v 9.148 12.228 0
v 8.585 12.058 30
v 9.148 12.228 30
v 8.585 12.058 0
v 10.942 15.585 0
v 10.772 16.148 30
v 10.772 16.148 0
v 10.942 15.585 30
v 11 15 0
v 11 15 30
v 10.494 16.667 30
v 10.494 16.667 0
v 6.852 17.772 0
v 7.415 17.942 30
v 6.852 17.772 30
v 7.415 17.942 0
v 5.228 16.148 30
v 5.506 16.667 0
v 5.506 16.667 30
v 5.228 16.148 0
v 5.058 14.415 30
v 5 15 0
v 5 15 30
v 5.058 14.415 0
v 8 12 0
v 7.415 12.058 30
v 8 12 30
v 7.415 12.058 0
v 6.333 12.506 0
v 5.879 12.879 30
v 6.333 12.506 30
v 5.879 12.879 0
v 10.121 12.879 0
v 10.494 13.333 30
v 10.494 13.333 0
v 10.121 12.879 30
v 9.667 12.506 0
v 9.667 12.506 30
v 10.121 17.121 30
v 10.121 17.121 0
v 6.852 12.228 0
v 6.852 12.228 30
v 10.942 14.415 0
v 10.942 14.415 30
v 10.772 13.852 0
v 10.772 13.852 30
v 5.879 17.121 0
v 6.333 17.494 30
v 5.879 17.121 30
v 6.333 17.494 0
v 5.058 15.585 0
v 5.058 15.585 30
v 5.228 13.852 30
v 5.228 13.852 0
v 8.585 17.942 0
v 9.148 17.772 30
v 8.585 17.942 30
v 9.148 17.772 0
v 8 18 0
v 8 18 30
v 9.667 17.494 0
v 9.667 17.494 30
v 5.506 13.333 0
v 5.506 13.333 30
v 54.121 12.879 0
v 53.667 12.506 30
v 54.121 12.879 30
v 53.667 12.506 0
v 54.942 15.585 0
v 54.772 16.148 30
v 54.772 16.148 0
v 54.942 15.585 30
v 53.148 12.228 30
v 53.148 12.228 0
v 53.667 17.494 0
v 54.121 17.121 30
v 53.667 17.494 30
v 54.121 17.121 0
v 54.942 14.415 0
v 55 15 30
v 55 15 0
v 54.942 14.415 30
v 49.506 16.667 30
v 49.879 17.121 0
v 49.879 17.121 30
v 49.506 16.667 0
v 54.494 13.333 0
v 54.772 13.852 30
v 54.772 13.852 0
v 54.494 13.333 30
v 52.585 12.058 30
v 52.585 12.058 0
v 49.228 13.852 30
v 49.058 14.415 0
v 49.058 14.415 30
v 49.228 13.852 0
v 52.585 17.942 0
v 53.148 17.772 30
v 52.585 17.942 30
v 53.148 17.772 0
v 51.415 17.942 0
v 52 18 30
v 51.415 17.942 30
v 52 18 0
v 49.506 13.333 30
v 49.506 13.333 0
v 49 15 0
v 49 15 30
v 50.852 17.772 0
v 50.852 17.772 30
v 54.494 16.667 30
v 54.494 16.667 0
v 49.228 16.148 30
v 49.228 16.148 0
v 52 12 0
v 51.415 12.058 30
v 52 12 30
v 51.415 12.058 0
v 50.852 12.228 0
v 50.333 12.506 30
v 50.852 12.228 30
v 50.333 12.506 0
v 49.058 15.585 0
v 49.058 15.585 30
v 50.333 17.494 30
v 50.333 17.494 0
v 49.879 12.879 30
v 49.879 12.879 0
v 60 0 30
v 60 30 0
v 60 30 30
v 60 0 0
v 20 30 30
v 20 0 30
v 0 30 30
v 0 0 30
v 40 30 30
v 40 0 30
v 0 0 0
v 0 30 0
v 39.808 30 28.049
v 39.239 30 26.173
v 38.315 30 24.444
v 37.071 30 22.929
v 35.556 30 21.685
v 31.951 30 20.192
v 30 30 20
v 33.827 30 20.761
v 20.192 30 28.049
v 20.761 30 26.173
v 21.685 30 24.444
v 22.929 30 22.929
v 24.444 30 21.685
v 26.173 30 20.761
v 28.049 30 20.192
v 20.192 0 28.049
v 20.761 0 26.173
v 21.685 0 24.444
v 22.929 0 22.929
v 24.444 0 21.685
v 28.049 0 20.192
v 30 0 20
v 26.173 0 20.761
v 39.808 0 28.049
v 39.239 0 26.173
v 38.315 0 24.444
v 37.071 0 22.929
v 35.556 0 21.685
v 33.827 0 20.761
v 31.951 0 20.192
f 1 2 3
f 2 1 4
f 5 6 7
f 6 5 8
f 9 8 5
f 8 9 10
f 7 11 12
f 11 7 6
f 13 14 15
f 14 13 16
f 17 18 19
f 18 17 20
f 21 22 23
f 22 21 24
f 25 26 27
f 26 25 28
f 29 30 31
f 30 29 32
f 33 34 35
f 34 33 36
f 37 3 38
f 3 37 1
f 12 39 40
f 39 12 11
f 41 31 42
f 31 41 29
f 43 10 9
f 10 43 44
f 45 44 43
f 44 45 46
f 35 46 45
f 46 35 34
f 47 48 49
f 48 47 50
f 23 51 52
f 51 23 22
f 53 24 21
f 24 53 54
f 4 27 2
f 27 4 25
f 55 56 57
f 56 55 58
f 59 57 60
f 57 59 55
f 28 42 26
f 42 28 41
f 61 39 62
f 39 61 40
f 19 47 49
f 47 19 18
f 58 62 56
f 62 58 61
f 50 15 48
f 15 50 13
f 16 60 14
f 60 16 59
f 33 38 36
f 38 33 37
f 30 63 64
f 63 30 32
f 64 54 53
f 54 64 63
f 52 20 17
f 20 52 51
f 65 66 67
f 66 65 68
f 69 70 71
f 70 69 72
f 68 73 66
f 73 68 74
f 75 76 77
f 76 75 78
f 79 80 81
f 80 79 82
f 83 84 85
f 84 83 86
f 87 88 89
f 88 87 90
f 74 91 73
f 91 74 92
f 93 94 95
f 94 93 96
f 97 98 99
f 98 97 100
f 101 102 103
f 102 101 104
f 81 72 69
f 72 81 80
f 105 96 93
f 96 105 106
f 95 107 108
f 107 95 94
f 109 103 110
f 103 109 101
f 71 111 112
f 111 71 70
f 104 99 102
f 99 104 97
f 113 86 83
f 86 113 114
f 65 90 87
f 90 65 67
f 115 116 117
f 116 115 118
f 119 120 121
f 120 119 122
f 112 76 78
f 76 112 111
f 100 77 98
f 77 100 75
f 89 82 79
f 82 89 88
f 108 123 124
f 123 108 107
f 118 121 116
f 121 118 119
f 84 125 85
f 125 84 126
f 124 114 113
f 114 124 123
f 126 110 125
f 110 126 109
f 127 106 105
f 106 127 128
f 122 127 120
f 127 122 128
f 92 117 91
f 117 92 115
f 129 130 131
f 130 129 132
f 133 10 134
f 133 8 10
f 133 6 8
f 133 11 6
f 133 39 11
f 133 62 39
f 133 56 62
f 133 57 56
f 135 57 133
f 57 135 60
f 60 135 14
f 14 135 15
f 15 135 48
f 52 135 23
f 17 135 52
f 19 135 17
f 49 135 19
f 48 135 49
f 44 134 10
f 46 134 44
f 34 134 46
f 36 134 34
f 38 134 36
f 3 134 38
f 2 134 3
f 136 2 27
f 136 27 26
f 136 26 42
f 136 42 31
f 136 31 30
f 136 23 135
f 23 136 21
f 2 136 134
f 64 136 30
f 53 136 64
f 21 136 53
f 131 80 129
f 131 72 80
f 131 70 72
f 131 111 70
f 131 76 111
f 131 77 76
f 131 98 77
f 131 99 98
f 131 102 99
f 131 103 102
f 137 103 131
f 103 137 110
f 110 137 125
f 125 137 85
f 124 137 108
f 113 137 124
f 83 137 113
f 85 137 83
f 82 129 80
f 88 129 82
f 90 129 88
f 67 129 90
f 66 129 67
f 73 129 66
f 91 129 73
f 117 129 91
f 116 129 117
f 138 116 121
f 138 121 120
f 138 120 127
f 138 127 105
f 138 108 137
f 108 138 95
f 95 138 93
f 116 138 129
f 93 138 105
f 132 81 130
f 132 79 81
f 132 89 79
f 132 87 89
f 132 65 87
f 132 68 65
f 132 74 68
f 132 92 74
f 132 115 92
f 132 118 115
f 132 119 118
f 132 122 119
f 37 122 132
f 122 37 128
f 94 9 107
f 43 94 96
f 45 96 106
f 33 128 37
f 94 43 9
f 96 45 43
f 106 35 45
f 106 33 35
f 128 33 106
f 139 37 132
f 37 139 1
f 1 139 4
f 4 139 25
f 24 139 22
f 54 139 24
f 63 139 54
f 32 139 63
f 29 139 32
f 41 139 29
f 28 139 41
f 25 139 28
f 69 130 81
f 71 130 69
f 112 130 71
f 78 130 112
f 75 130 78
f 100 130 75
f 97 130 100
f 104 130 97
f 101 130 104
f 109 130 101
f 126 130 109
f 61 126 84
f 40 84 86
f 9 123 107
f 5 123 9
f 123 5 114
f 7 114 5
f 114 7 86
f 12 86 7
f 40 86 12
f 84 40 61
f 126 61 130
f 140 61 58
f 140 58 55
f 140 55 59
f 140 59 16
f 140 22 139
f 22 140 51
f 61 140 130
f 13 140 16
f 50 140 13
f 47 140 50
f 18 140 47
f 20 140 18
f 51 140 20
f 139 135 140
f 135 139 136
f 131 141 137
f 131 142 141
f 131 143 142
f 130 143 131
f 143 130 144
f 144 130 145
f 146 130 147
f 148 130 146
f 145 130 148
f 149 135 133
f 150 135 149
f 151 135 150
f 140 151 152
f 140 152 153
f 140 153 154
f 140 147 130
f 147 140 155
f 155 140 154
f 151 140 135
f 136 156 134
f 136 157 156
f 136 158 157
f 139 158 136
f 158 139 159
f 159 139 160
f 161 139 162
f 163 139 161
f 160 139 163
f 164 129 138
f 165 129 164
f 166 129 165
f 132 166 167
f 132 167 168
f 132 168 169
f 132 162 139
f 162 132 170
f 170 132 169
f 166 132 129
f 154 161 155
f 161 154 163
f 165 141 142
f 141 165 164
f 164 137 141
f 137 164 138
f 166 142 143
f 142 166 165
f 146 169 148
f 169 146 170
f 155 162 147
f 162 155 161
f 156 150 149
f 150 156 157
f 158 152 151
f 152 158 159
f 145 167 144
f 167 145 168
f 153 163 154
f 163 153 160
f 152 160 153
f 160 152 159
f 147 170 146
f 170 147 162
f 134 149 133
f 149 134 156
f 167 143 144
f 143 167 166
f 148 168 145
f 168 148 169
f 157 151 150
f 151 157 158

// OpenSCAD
$fn = 32;

// ----------------------------------------------------------------------
// Saddle clamp: plain shaft clamp
// ----------------------------------------------------------------------

// --- parameters (mm) ---
blk_l = 60;               // block length, X
blk_w = 30;               // block width, Y
blk_h = 30;               // block height
clamp_r = 10;             // shaft groove radius
hole_r = 3;               // bolt hole radius
hole_m = 8;               // bolt hole margin from the ends
fit_tol = 0.1;            // tolerance for press fits, mm
free_tol = 0.3;           // tolerance for clearance fits, mm

saw_depth = clamp_r + 3;  // saw kerf depth

difference() {
  cube([blk_l, blk_w, blk_h]);
  translate([blk_l / 2, -1, blk_h])
    rotate([-90, 0, 0])
      cylinder(h = blk_w + 2, r = clamp_r);
  for (sx = [0, 1])
    translate([sx ? blk_l - hole_m : hole_m, blk_w / 2, -1])
      cylinder(r = hole_r, h = blk_h + 2);
}
